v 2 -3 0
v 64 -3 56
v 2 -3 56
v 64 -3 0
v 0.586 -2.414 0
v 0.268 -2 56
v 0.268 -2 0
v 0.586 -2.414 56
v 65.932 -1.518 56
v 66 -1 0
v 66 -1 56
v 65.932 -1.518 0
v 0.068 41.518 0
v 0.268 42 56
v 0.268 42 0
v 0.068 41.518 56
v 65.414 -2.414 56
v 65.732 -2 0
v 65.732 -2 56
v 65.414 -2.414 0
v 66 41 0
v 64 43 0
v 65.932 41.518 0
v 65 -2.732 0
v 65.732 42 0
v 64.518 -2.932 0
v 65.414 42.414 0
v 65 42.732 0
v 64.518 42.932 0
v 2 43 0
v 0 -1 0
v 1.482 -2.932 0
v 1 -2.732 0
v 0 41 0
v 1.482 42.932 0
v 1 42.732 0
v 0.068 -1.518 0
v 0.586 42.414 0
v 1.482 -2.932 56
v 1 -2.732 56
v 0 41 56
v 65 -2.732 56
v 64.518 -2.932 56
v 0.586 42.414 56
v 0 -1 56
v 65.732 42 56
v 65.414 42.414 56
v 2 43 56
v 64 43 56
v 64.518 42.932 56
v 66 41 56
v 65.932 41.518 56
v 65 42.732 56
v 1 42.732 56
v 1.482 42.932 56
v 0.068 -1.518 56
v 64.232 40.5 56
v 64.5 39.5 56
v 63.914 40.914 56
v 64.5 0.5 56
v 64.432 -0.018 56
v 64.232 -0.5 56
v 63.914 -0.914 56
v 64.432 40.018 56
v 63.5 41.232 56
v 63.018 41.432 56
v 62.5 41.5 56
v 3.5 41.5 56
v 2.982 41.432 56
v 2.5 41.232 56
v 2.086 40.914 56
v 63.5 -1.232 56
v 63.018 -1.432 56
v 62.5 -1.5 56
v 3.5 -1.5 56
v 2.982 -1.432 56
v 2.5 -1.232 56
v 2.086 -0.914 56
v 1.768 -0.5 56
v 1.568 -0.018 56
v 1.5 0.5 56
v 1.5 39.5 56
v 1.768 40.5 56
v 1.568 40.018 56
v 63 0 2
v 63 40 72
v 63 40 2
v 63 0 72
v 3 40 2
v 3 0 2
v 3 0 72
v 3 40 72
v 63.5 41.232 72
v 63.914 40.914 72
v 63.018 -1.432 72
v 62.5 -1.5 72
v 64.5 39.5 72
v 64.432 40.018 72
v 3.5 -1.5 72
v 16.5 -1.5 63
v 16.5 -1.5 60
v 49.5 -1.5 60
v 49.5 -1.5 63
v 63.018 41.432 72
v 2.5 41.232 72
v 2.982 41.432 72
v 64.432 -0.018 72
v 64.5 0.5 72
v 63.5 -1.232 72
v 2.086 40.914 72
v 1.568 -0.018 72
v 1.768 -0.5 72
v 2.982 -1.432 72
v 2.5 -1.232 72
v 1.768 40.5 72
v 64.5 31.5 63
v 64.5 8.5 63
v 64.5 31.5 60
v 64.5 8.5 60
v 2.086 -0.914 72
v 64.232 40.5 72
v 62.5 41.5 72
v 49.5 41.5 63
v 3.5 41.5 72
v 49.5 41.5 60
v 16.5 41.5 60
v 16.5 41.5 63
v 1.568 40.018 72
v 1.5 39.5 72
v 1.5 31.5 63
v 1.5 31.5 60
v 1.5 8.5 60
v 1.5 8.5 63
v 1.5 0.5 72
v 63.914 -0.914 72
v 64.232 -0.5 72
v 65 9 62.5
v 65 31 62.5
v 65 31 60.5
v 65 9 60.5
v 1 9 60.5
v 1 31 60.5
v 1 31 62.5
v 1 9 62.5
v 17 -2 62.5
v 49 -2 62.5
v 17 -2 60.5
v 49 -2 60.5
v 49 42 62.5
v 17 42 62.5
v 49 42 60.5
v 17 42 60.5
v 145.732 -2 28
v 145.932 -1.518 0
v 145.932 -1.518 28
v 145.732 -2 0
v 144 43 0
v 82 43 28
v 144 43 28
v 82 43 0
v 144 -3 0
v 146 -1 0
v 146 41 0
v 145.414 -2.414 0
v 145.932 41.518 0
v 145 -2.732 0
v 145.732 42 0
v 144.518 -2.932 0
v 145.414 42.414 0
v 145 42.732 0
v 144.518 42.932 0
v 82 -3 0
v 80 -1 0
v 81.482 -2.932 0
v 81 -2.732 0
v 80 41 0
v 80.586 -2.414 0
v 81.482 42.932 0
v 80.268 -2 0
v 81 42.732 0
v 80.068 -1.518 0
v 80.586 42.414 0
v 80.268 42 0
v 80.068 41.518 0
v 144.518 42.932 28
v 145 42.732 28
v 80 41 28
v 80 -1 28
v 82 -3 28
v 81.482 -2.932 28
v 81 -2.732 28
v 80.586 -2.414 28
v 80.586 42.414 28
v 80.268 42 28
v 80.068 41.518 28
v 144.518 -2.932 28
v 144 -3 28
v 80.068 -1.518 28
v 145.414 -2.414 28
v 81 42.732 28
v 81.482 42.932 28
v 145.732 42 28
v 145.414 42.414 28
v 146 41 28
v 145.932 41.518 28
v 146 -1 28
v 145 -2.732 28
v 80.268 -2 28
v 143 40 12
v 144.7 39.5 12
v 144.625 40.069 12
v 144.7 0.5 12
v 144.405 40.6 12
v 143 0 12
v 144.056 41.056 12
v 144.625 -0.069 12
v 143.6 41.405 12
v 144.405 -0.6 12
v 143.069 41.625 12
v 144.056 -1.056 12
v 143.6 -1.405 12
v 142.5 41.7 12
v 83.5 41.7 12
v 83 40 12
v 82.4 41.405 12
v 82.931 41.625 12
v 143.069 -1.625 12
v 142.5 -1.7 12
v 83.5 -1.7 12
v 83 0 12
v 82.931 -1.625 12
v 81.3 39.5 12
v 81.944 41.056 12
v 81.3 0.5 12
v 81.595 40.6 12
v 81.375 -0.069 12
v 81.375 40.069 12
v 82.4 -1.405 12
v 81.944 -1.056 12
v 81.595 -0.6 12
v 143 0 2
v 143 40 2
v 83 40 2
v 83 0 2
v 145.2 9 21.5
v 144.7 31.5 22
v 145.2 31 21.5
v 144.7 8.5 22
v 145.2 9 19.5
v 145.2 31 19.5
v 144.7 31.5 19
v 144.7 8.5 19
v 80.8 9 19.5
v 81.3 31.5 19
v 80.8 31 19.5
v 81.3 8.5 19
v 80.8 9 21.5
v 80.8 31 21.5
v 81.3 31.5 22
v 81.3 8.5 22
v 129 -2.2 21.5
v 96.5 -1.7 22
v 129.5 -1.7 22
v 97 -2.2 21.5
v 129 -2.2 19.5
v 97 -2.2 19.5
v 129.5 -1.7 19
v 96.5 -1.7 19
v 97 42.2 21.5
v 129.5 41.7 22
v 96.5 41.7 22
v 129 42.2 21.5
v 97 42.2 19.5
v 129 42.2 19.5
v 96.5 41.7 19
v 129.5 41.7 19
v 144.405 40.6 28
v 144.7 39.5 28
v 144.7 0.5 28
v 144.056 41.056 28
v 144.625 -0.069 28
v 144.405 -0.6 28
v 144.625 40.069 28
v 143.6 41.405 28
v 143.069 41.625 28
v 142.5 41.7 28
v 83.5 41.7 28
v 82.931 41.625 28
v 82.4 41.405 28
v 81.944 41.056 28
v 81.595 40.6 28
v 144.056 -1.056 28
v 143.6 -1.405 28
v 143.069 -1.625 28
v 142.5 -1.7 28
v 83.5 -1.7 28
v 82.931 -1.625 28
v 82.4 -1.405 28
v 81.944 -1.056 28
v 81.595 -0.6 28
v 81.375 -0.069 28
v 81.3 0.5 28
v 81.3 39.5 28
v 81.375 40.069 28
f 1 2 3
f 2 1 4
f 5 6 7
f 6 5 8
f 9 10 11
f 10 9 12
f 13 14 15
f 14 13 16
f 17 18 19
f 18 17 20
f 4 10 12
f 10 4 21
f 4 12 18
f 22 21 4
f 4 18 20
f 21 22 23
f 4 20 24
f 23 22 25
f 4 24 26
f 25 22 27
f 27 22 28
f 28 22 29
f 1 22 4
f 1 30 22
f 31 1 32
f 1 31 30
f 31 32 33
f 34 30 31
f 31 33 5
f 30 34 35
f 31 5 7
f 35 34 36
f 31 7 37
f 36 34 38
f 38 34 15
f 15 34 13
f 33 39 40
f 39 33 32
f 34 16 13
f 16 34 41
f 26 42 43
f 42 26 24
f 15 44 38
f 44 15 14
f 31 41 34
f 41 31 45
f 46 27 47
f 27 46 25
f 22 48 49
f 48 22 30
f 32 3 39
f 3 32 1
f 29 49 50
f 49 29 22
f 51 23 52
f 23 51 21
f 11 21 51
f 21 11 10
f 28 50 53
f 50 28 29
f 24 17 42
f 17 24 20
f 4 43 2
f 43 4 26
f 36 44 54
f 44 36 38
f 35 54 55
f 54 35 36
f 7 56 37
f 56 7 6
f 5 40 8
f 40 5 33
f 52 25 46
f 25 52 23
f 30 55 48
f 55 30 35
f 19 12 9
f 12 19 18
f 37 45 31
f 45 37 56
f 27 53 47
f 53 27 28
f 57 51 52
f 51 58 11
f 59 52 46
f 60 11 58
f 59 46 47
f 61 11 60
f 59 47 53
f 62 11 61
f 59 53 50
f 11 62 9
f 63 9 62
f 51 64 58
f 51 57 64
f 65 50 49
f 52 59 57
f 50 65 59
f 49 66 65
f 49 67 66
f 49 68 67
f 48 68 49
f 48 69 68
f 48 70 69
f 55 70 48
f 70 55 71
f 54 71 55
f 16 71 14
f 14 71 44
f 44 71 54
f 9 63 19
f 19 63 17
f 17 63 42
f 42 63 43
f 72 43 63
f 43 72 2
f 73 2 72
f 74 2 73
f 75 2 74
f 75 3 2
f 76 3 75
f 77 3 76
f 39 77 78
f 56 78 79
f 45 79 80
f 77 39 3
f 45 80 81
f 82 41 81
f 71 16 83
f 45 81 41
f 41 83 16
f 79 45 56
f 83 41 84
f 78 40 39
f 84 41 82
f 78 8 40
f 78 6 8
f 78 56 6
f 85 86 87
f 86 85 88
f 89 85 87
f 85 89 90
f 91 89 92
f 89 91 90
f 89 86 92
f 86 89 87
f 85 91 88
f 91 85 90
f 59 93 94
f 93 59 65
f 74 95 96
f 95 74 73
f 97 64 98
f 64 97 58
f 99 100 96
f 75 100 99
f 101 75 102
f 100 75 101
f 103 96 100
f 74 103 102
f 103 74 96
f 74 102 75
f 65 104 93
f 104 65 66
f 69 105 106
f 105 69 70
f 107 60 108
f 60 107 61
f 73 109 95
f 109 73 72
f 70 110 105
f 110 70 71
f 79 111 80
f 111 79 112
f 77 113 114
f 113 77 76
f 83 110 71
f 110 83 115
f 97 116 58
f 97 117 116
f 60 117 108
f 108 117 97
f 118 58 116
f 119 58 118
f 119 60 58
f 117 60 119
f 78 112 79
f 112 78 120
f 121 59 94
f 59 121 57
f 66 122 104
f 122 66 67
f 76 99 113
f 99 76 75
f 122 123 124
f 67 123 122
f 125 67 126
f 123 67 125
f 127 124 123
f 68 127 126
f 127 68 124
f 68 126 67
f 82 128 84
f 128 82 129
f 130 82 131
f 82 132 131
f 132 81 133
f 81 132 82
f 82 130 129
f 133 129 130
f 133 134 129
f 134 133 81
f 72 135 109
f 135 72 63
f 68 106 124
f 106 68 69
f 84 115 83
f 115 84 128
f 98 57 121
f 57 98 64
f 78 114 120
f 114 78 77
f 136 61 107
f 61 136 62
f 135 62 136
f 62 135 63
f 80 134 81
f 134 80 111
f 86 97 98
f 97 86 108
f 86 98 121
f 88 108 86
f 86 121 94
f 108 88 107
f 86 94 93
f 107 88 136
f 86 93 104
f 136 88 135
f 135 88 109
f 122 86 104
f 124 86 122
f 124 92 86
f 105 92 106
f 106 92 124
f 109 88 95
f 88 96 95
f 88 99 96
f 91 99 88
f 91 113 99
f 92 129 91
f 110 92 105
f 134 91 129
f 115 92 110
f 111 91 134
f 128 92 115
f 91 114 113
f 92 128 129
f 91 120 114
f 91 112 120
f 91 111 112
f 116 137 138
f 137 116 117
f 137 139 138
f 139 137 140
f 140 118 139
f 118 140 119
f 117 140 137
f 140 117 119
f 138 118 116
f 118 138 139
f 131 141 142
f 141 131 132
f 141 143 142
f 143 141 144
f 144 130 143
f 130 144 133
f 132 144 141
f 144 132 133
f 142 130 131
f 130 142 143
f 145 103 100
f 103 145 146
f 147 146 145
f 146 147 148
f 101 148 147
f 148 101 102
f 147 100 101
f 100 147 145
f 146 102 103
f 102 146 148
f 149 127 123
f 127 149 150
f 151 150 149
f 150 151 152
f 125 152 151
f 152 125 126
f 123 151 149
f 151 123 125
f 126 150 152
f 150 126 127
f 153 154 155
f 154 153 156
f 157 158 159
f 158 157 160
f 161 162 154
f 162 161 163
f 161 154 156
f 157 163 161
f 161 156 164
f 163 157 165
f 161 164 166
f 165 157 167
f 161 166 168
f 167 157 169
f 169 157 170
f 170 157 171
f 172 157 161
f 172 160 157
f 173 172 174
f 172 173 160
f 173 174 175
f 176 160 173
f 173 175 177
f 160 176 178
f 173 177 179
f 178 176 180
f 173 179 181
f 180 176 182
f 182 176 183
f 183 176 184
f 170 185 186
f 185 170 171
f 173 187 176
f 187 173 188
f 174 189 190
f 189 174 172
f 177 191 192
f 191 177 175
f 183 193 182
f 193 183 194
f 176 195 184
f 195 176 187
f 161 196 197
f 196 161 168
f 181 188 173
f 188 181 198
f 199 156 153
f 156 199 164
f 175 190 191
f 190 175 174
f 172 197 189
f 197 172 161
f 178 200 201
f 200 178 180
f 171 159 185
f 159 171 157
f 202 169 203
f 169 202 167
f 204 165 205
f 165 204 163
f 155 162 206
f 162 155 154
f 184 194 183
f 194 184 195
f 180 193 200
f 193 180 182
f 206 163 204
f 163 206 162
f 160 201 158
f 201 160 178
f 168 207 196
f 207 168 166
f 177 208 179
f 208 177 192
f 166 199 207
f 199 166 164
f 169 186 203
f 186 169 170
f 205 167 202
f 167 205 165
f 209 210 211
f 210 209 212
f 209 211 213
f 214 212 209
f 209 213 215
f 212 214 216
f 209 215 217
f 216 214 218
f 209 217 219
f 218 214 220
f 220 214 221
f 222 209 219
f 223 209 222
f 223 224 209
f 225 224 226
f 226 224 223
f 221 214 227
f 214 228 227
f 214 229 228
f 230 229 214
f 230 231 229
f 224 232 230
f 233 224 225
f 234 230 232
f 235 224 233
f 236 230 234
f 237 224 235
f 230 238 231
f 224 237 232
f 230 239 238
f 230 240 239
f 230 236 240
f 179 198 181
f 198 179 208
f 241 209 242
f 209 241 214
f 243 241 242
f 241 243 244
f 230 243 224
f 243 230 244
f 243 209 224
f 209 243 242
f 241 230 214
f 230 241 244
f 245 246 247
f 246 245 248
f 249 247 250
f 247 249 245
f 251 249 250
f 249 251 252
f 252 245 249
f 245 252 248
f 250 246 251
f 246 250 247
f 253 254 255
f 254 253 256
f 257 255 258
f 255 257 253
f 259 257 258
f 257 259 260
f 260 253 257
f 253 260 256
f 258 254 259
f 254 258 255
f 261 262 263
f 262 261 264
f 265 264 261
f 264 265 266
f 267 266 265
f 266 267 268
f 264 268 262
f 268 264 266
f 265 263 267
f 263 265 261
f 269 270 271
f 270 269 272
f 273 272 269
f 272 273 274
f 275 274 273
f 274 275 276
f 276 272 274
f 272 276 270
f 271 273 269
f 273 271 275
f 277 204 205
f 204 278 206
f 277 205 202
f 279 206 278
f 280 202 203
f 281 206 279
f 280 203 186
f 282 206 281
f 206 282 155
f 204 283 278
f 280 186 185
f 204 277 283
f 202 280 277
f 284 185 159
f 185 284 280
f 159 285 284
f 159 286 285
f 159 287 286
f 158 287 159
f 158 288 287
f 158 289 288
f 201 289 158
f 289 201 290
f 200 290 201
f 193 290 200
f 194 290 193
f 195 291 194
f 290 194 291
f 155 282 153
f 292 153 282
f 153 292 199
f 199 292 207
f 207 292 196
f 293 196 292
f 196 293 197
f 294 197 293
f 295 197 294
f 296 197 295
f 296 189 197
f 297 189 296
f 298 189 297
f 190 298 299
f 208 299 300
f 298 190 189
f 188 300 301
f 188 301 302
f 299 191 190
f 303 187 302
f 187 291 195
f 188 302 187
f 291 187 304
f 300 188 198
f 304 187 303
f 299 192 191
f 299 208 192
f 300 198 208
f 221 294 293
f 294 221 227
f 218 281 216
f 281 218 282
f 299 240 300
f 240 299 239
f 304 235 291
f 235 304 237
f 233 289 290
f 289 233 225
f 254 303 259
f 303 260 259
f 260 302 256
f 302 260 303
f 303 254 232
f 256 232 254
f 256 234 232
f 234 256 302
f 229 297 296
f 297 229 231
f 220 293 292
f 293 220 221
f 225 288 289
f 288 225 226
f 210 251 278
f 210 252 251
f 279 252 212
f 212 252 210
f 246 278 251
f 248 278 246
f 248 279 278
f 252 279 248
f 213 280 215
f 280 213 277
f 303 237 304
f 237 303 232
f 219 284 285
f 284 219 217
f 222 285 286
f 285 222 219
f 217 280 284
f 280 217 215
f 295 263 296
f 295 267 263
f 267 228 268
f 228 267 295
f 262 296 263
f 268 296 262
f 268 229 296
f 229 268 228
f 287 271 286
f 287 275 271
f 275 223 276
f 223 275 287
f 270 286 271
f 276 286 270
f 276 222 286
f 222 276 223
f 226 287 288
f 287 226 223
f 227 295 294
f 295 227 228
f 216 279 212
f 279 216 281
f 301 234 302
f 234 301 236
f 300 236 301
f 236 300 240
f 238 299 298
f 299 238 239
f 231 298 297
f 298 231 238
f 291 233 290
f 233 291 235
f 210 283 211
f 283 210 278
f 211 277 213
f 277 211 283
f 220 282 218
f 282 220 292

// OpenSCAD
// file: LatchObj.scad
module Latch(width=10, height=3) {

    ObjPoints = [
        // x, y , z
        [0.5, 0, 0.5], //0
        [width-0.5, 0, 0.5], //1
        [width, 0.5, 0], //2
        [0, 0.5, 0], //3
        [0.5, 0, height-0.5], //4
        [width-0.5, 0, height-0.5], //5
        [width, 0.5, height], //6
        [0, 0.5, height] //7
    ]; 
      
    ObjFaces = [
        [0,1,2,3],  // bottom
        [4,5,1,0],  // front
        [7,6,5,4],  // top
        [5,6,2,1],  // right
        [6,7,3,2],  // back
        [7,4,0,3]   // left
    ]; 

    union() {
        color("deeppink") 
            rotate([180,0,0]) 
                translate([-width/2, -0.5, -(height/2)]) 
                    polyhedron( points=ObjPoints, faces=ObjFaces);
        color("blue")
            translate([-width/2,-0.2,-height/2])
                cube([width, 0.2, height]);
    }
}

//Latch();

module separator(width=30, height=40, thickness=1.5)
{
    difference() {
        union() {
            cube([width, height-(width/2), thickness]);
            translate([width/2, height-(width/2), 0]) cylinder(thickness, width/2/2, width/2/2, $fn=48);
        }
        translate([0, height-(width/2), -1]) cylinder(3,width/2/2, width/2/2, $fn=48);
        translate([width, height-(width/2),-1]) cylinder(3,width/2/2, width/2/2, $fn=48);
    }
    

    
}
// main file
use <LatchObj.scad>

// Input Variables
// -------------------------------

    /* [Global] */

    /* [Card Box] */

        // The total width used by the cards
        inner_width             =   60; // [10:200]

        // The total height used by the cards
        inner_height            =   80; // [50:250]

        section_font_size       =   6;  // [2:10]
        
//        rounded                 =   true;
        
        overlap_percent         =   20; // [20:10:80]
        latch_type              =   0; // [0:Both Side, 1:Width Side Only, 2:Depth Side Only]    

    /* [Cover] */
        
        // If your cards are a bit blunt, using this option will remove the full thikness in the cover part.
        cover_loose_fit                =  false;
    
        cover_label              =   "";
        cover_label_font_family  =   "Trebuchet MS:style=Regular"; // ["Trebuchet MS:style=Regular":Trebuchet, "Sukhumvit Set:style=Text":Sukhumvit, "Silom:style=Regular":Silom]
        cover_label_font_size    =   6; // [6:18]
        cover_label_angle        =   0; // [0:15:90]
    
            //"Trebuchet MS:style=Regular"
        //"Sukhumvit Set:style=Text"
        //"Silom:style=Regular"
    
    /* [Section 1] */
    
        // Section depth
        section_01_inner_depth  =   40;
        // Section label, empty for none
        section_01_label        =   "";

    /* [Section 2] */
    
        // Section depth
        section_02_inner_depth  =   0;
        // Section label, empty for none
        section_02_label        =   "";

    /* [Section 3] */
    
        // Section depth
        section_03_inner_depth  =   0;
        // Section label, empty for none
        section_03_label        =   "";
        
    /* [Section 4] */
    
        // Section depth
        section_04_inner_depth  =   0;
        // Section label, empty for none
        section_04_label        =   "";
        
    /* [Section 5] */
    
        // Section depth
        section_05_inner_depth  =   0;
        // Section label, empty for none
        section_05_label        =   "";
        
    /* [Section 6] */
    
        // Section depth
        section_06_inner_depth  =   0;
        // Section label, empty for none
        section_06_label        =   "";
        
    /* [Section 7] */
    
        // Section depth
        section_07_inner_depth  =   0;
        // Section label, empty for none
        section_07_label        =   "";
        
    /* [Section 8] */
    
        // Section depth
        section_08_inner_depth  =   0;
        // Section label, empty for none
        section_08_label        =   "";
        
    /* [Section 9] */
    
        // Section depth
        section_09_inner_depth  =   0;
        // Section label, empty for none
        section_09_label        =   "";
        
    /* [Section 10] */
    
        // Section depth
        section_10_inner_depth  =   0;
        // Section label, empty for none
        section_10_label        =   "";
    
// -------------------------------
/* [Hidden] */

// Config
    enable_preview_rendering    =   true;

// Constance, should not be modify
// -------------------------------
    damper_gap              =   0.2;
    cover_inner_height      =   10;
    thickness               =   3;
    rounded_radius          =   2;
    latch_height            =   3;
    latch_border_space      =   6;
// -------------------------------

// Calculated variables
// -------------------------------
    inner_depth             =   30;                 // The total debth used by the cards (default 30 for preview, real value 
                                                    // calculated with sum of section_XX_inner_depth.
    overlap_height           =   (overlap_percent/100*inner_height);
    
    section_count           =   get_section_count();
    section_debth_concat    =   get_section_debth_concat();
    section_debth_sum       =   get_section_debth_sum();
// -------------------------------


if (enable_preview_rendering && $preview) {    

    translate([50, -3, 0])
        rotate([10,0,120])
            boxBottom(inner_width, inner_height, thickness, rounded_radius) {
                boxSections(section_debth_sum);
            }
    
    translate([0, 10+inner_width, 0])
        rotate([25,0,80])
            boxCover(inner_width, thickness, rounded_radius, cover_label, cover_label_font_size, cover_label_font_family);
        
} else {
    
    translate([0, -3, 0])
        boxBottom(inner_width, inner_height, thickness, rounded_radius) {
            boxSections(section_debth_sum);
        }
    
    translate([20+inner_width,-3,0])
        boxCover(inner_width, thickness, rounded_radius, cover_label, cover_label_font_size, cover_label_font_family);
        
}


// Sections functions

function get_section_count() = (
    (section_01_inner_depth <= 0) ? 0 : 
    (section_02_inner_depth <= 0) ? 1 :
    (section_03_inner_depth <= 0) ? 2 :
    (section_04_inner_depth <= 0) ? 3 :
    (section_05_inner_depth <= 0) ? 4 :
    (section_06_inner_depth <= 0) ? 5 :
    (section_07_inner_depth <= 0) ? 6 :
    (section_08_inner_depth <= 0) ? 7 :
    (section_09_inner_depth <= 0) ? 8 :
    (section_10_inner_depth <= 0) ? 9 : 10
);

function get_section_debth_sum() = (
[ for (a=0, b=section_debth_concat[0]; a < section_count+1; a= a+1, b=b+(section_debth_concat[a]==undef?0:section_debth_concat[a])) b ]
);

function get_section_debth_concat() = (
    concat(
        section_01_inner_depth, 
        section_02_inner_depth, 
        section_03_inner_depth, 
        section_04_inner_depth, 
        section_05_inner_depth, 
        section_06_inner_depth, 
        section_07_inner_depth, 
        section_08_inner_depth, 
        section_09_inner_depth, 
        section_10_inner_depth
    )
);



// Box bottom modules


module writeSectionLabels() {
    
    if (section_01_inner_depth > 0)
        translate([(inner_width/2)+thickness, (section_01_inner_depth/2)+thickness, 1]) linear_extrude(3) text(section_01_label, size=section_font_size, $fn=24, halign="center", valign="center");

    if (section_02_inner_depth > 0)
        translate([(inner_width/2)+thickness, (section_02_inner_depth/2)+thickness+section_debth_sum[0]+((thickness/2)*1), 1]) linear_extrude(5) text(section_02_label, size=section_font_size, halign="center", valign="center");
    
    if (section_03_inner_depth > 0)
        translate([(inner_width/2)+thickness, (section_03_inner_depth/2)+thickness+section_debth_sum[1]+((thickness/2)*2), 1]) linear_extrude(5) text(section_03_label, size=section_font_size, halign="center", valign="center");
    
    if (section_04_inner_depth > 0)
        translate([(inner_width/2)+thickness, (section_04_inner_depth/2)+thickness+section_debth_sum[2]+((thickness/2)*3), 1]) linear_extrude(5) text(section_04_label, size=section_font_size, halign="center", valign="center");
    
    if (section_05_inner_depth > 0)
        translate([(inner_width/2)+thickness, (section_05_inner_depth/2)+thickness+section_debth_sum[3]+((thickness/2)*4), 1]) linear_extrude(5) text(section_05_label, size=section_font_size, halign="center", valign="center");
    
    if (section_06_inner_depth > 0)
        translate([(inner_width/2)+thickness, (section_06_inner_depth/2)+thickness+section_debth_sum[4]+((thickness/2)*5), 1]) linear_extrude(5) text(section_06_label, size=section_font_size, halign="center", valign="center");
    
    if (section_07_inner_depth > 0)
        translate([(inner_width/2)+thickness, (section_07_inner_depth/2)+thickness+section_debth_sum[5]+((thickness/2)*6), 1]) linear_extrude(5) text(section_07_label, size=section_font_size, halign="center", valign="center");

    if (section_08_inner_depth > 0)
        translate([(inner_width/2)+thickness, (section_08_inner_depth/2)+thickness+section_debth_sum[6]+((thickness/2)*7), 1]) linear_extrude(5) text(section_08_label, size=section_font_size, halign="center", valign="center");

    if (section_09_inner_depth > 0)
        translate([(inner_width/2)+thickness, (section_09_inner_depth/2)+thickness+section_debth_sum[7]+((thickness/2)*8), 1]) linear_extrude(5) text(section_09_label, size=section_font_size, halign="center", valign="center");
    
    if (section_10_inner_depth > 0)
        translate([(inner_width/2)+thickness, (section_10_inner_depth/2)+thickness+section_debth_sum[8]+((thickness/2)*9), 1]) linear_extrude(5) text(section_10_label, size=section_font_size, halign="center", valign="center");
    
//    if (section_01_inner_depth > 0)
//        linear_extrude(5) text(section_01_label, size=6, halign="center", valign="center");
    
}

module boxBottom(innerWidth=60, innerHeight=80, thickness=3, roundCornerRadius=2) {

    innerWidth  =   innerWidth+(thickness*2);
    innerHeight =   innerHeight-overlap_height-cover_inner_height;
    innerDepth  =   (section_debth_sum[section_count]+((section_count-1)*(thickness/2)))+(thickness*2);

    union() {
        
        // Bottom box
        // -------------------
        difference() {    
            translate([roundCornerRadius, roundCornerRadius, 0]) {
                minkowski()
                {
                  cube([innerWidth-(roundCornerRadius*2), innerDepth-(roundCornerRadius*2), (2+innerHeight-1)]); // -1 because cylinder use h=1
                  cylinder($fn=24, r=roundCornerRadius, h=1);
                }
            }
            
            translate([thickness, thickness, 2]) {
                cube([innerWidth-(2*thickness), innerDepth-(2*thickness), innerHeight+10]);
            }

            color("red") writeSectionLabels();
            
        }
     
        // Top overlap
        // -------------------
        difference() {
            translate([roundCornerRadius+(thickness/2), roundCornerRadius+(thickness/2), innerHeight]) {
                minkowski()
                {
                  cube([innerWidth-(roundCornerRadius*2)-(thickness), innerDepth-(roundCornerRadius*2)-(thickness), (2+overlap_height-1)]);
                  cylinder($fn=24, r=roundCornerRadius, h=1);
                }
            }
            translate([thickness, thickness, innerHeight-5]) {
                cube([innerWidth-(2*thickness), innerDepth-(2*thickness), overlap_height+10]);
            }
        }
        
        // Draw latches
        // -------------------
        
        if ((latch_type == 0) || (latch_type == 2)) {
            // Depth Side
            rotate([0, 0, 90])
                translate([(innerDepth/2), -innerWidth+(thickness/2), innerHeight+(latch_height/2)+latch_border_space]) 
                    rotate([180, 0, 0])
                        Latch(innerDepth/2);

            rotate([0, 0, 90]) 
                translate([(innerDepth/2), -(thickness/2), innerHeight+(latch_height/2)+latch_border_space])
                    Latch(innerDepth/2);
        }
        
        if ((latch_type == 0) || (latch_type == 1)) {
            // Width Side
            rotate([0, 0, 0])
                translate([(innerWidth/2), (thickness/2), innerHeight+(latch_height/2)+latch_border_space])
                    rotate([180, 0, 0])
                        Latch(innerWidth/2);

            rotate([0, 0, 0])
                translate([(innerWidth/2), innerDepth-(thickness/2), innerHeight+(latch_height/2)+latch_border_space])
                    rotate([180, 0, 180])
                        Latch(innerWidth/2);
        }
            
        let ($innerWidth=innerWidth-(2*thickness), $innerHeight=innerHeight+overlap_height-thickness, $thickness=thickness) {
            for ( i=[0:1:$children-1], $sectionIndex=i) {
                children(i);
            }
        }
    }
}




module boxSections(innerDepths) {

    // Make sure the boxSection is called inside a box
    if (parent_module(1) == "boxBottom") {

        if (section_count > 1) {
            for (i= [0:1:section_count-2]) {
                if (section_debth_concat[i+1] > ($thickness/2)) {
                    boxSection(section_debth_sum[i] + (($thickness/2)*i));
                }
            }
        }
        
    } else {
        echo("ERROR: boxSection must be called within a box object.");
    }
}


module boxSection(innerDepth=30) {

    // Make sure the boxSection is called inside a box
    if ((parent_module(1) == "boxBottom") || (parent_module(1) == "boxSections")) {
        
        //          X          Y                                            Z
        color("yellow") translate([$thickness, (innerDepth+$thickness)+($sectionIndex*($thickness/2)), $thickness])
            cube([$innerWidth, $thickness/2, $innerHeight]);
        
    } else {
        echo("ERROR: boxSection must be called within a box object.");
    }
}


//
// Box top modules

module boxCover(innerWidth=60, thickness=3, roundCornerRadius=2, label="7 Familles", label_size=8, label_font="Trebuchet MS:style=Regular") {

    innerWidth=innerWidth+(thickness*2);
    innerDepth=(section_debth_sum[section_count]+((section_count-1)*(thickness/2)))+(thickness*2);
    innerHeight=cover_inner_height;

    // Top Box
    // -------------------
    difference() {
        
        translate([roundCornerRadius, roundCornerRadius, 0]) {
            minkowski()
            {
              cube([innerWidth-(roundCornerRadius*2), innerDepth-(roundCornerRadius*2), (2+innerHeight-1)]); // -1 because cylinder use h=1
              cylinder($fn=24, r=roundCornerRadius, h=1);
            }
        }
        
        if (cover_loose_fit) {
            translate([roundCornerRadius+(thickness/2), roundCornerRadius+(thickness/2), innerHeight-8]) {
                minkowski()
                {
                  cube([innerWidth-(roundCornerRadius*2)-(thickness), innerDepth-(roundCornerRadius*2)-(thickness), (innerHeight+10)]);
                  cylinder($fn=24, r=roundCornerRadius+damper_gap, h=1);
                }
            }
        }
        else {
            translate([thickness, thickness, 2]) {
                cube([innerWidth-(2*thickness), innerDepth-(2*thickness), innerHeight+10]);
            }
        }

        
        // Top box text
        translate([innerWidth/2, (innerDepth/2), -0.2])        
            linear_extrude(thickness/2)
                rotate([0, 180, cover_label_angle]) text(str(label), label_size, valign="center", halign="center", spacing = 1, font=label_font);

    }
    
    
    // Top overlap
    // -------------------
    difference() {
        
        translate([roundCornerRadius, roundCornerRadius, innerHeight]) {
            minkowski()
            {
              cube([innerWidth-(roundCornerRadius*2), innerDepth-(roundCornerRadius*2), (2+overlap_height-1)]);
              cylinder($fn=24, r=roundCornerRadius, h=1);
            }
        }

        translate([roundCornerRadius+(thickness/2), roundCornerRadius+(thickness/2), innerHeight-5]) {
            minkowski()
            {
              cube([innerWidth-(roundCornerRadius*2)-(thickness), innerDepth-(roundCornerRadius*2)-(thickness), (overlap_height+10)]);
              cylinder($fn=24, r=roundCornerRadius+damper_gap, h=1);
            }
        }
        // Draw latches
        // -------------------
        if ((latch_type == 0) || (latch_type == 2)) {
            rotate([0, 0, 90])
                translate([(innerDepth/2), -innerWidth+(thickness/2)-damper_gap, 2+innerHeight+overlap_height-(latch_height/2)-latch_border_space])  //
                    rotate([180, 0, 0])
                            Latch(innerDepth/2);
            rotate([0, 0, 90]) 
                translate([(innerDepth/2), -(thickness/2)+damper_gap, 2+innerHeight+overlap_height-(latch_height/2)-latch_border_space])
                    Latch(innerDepth/2);
        }

        if ((latch_type == 0) || (latch_type == 1)) {
            rotate([0, 0, 0])
                translate([(innerWidth/2), (thickness/2)-damper_gap, 2+innerHeight+overlap_height-(latch_height/2)-latch_border_space])
                    rotate([180, 0, 0])
                        Latch(innerWidth/2);

            rotate([0, 0, 0])
                translate([(innerWidth/2), innerDepth-(thickness/2)+damper_gap, 2+innerHeight+overlap_height-(latch_height/2)-latch_border_space]) //
                    rotate([180, 0, 180])
                        Latch(innerWidth/2);
        }
    }
    
}
// 8

//color("red") translate([0,0,(-0.5)+72]) square([500, 1], center=false);
